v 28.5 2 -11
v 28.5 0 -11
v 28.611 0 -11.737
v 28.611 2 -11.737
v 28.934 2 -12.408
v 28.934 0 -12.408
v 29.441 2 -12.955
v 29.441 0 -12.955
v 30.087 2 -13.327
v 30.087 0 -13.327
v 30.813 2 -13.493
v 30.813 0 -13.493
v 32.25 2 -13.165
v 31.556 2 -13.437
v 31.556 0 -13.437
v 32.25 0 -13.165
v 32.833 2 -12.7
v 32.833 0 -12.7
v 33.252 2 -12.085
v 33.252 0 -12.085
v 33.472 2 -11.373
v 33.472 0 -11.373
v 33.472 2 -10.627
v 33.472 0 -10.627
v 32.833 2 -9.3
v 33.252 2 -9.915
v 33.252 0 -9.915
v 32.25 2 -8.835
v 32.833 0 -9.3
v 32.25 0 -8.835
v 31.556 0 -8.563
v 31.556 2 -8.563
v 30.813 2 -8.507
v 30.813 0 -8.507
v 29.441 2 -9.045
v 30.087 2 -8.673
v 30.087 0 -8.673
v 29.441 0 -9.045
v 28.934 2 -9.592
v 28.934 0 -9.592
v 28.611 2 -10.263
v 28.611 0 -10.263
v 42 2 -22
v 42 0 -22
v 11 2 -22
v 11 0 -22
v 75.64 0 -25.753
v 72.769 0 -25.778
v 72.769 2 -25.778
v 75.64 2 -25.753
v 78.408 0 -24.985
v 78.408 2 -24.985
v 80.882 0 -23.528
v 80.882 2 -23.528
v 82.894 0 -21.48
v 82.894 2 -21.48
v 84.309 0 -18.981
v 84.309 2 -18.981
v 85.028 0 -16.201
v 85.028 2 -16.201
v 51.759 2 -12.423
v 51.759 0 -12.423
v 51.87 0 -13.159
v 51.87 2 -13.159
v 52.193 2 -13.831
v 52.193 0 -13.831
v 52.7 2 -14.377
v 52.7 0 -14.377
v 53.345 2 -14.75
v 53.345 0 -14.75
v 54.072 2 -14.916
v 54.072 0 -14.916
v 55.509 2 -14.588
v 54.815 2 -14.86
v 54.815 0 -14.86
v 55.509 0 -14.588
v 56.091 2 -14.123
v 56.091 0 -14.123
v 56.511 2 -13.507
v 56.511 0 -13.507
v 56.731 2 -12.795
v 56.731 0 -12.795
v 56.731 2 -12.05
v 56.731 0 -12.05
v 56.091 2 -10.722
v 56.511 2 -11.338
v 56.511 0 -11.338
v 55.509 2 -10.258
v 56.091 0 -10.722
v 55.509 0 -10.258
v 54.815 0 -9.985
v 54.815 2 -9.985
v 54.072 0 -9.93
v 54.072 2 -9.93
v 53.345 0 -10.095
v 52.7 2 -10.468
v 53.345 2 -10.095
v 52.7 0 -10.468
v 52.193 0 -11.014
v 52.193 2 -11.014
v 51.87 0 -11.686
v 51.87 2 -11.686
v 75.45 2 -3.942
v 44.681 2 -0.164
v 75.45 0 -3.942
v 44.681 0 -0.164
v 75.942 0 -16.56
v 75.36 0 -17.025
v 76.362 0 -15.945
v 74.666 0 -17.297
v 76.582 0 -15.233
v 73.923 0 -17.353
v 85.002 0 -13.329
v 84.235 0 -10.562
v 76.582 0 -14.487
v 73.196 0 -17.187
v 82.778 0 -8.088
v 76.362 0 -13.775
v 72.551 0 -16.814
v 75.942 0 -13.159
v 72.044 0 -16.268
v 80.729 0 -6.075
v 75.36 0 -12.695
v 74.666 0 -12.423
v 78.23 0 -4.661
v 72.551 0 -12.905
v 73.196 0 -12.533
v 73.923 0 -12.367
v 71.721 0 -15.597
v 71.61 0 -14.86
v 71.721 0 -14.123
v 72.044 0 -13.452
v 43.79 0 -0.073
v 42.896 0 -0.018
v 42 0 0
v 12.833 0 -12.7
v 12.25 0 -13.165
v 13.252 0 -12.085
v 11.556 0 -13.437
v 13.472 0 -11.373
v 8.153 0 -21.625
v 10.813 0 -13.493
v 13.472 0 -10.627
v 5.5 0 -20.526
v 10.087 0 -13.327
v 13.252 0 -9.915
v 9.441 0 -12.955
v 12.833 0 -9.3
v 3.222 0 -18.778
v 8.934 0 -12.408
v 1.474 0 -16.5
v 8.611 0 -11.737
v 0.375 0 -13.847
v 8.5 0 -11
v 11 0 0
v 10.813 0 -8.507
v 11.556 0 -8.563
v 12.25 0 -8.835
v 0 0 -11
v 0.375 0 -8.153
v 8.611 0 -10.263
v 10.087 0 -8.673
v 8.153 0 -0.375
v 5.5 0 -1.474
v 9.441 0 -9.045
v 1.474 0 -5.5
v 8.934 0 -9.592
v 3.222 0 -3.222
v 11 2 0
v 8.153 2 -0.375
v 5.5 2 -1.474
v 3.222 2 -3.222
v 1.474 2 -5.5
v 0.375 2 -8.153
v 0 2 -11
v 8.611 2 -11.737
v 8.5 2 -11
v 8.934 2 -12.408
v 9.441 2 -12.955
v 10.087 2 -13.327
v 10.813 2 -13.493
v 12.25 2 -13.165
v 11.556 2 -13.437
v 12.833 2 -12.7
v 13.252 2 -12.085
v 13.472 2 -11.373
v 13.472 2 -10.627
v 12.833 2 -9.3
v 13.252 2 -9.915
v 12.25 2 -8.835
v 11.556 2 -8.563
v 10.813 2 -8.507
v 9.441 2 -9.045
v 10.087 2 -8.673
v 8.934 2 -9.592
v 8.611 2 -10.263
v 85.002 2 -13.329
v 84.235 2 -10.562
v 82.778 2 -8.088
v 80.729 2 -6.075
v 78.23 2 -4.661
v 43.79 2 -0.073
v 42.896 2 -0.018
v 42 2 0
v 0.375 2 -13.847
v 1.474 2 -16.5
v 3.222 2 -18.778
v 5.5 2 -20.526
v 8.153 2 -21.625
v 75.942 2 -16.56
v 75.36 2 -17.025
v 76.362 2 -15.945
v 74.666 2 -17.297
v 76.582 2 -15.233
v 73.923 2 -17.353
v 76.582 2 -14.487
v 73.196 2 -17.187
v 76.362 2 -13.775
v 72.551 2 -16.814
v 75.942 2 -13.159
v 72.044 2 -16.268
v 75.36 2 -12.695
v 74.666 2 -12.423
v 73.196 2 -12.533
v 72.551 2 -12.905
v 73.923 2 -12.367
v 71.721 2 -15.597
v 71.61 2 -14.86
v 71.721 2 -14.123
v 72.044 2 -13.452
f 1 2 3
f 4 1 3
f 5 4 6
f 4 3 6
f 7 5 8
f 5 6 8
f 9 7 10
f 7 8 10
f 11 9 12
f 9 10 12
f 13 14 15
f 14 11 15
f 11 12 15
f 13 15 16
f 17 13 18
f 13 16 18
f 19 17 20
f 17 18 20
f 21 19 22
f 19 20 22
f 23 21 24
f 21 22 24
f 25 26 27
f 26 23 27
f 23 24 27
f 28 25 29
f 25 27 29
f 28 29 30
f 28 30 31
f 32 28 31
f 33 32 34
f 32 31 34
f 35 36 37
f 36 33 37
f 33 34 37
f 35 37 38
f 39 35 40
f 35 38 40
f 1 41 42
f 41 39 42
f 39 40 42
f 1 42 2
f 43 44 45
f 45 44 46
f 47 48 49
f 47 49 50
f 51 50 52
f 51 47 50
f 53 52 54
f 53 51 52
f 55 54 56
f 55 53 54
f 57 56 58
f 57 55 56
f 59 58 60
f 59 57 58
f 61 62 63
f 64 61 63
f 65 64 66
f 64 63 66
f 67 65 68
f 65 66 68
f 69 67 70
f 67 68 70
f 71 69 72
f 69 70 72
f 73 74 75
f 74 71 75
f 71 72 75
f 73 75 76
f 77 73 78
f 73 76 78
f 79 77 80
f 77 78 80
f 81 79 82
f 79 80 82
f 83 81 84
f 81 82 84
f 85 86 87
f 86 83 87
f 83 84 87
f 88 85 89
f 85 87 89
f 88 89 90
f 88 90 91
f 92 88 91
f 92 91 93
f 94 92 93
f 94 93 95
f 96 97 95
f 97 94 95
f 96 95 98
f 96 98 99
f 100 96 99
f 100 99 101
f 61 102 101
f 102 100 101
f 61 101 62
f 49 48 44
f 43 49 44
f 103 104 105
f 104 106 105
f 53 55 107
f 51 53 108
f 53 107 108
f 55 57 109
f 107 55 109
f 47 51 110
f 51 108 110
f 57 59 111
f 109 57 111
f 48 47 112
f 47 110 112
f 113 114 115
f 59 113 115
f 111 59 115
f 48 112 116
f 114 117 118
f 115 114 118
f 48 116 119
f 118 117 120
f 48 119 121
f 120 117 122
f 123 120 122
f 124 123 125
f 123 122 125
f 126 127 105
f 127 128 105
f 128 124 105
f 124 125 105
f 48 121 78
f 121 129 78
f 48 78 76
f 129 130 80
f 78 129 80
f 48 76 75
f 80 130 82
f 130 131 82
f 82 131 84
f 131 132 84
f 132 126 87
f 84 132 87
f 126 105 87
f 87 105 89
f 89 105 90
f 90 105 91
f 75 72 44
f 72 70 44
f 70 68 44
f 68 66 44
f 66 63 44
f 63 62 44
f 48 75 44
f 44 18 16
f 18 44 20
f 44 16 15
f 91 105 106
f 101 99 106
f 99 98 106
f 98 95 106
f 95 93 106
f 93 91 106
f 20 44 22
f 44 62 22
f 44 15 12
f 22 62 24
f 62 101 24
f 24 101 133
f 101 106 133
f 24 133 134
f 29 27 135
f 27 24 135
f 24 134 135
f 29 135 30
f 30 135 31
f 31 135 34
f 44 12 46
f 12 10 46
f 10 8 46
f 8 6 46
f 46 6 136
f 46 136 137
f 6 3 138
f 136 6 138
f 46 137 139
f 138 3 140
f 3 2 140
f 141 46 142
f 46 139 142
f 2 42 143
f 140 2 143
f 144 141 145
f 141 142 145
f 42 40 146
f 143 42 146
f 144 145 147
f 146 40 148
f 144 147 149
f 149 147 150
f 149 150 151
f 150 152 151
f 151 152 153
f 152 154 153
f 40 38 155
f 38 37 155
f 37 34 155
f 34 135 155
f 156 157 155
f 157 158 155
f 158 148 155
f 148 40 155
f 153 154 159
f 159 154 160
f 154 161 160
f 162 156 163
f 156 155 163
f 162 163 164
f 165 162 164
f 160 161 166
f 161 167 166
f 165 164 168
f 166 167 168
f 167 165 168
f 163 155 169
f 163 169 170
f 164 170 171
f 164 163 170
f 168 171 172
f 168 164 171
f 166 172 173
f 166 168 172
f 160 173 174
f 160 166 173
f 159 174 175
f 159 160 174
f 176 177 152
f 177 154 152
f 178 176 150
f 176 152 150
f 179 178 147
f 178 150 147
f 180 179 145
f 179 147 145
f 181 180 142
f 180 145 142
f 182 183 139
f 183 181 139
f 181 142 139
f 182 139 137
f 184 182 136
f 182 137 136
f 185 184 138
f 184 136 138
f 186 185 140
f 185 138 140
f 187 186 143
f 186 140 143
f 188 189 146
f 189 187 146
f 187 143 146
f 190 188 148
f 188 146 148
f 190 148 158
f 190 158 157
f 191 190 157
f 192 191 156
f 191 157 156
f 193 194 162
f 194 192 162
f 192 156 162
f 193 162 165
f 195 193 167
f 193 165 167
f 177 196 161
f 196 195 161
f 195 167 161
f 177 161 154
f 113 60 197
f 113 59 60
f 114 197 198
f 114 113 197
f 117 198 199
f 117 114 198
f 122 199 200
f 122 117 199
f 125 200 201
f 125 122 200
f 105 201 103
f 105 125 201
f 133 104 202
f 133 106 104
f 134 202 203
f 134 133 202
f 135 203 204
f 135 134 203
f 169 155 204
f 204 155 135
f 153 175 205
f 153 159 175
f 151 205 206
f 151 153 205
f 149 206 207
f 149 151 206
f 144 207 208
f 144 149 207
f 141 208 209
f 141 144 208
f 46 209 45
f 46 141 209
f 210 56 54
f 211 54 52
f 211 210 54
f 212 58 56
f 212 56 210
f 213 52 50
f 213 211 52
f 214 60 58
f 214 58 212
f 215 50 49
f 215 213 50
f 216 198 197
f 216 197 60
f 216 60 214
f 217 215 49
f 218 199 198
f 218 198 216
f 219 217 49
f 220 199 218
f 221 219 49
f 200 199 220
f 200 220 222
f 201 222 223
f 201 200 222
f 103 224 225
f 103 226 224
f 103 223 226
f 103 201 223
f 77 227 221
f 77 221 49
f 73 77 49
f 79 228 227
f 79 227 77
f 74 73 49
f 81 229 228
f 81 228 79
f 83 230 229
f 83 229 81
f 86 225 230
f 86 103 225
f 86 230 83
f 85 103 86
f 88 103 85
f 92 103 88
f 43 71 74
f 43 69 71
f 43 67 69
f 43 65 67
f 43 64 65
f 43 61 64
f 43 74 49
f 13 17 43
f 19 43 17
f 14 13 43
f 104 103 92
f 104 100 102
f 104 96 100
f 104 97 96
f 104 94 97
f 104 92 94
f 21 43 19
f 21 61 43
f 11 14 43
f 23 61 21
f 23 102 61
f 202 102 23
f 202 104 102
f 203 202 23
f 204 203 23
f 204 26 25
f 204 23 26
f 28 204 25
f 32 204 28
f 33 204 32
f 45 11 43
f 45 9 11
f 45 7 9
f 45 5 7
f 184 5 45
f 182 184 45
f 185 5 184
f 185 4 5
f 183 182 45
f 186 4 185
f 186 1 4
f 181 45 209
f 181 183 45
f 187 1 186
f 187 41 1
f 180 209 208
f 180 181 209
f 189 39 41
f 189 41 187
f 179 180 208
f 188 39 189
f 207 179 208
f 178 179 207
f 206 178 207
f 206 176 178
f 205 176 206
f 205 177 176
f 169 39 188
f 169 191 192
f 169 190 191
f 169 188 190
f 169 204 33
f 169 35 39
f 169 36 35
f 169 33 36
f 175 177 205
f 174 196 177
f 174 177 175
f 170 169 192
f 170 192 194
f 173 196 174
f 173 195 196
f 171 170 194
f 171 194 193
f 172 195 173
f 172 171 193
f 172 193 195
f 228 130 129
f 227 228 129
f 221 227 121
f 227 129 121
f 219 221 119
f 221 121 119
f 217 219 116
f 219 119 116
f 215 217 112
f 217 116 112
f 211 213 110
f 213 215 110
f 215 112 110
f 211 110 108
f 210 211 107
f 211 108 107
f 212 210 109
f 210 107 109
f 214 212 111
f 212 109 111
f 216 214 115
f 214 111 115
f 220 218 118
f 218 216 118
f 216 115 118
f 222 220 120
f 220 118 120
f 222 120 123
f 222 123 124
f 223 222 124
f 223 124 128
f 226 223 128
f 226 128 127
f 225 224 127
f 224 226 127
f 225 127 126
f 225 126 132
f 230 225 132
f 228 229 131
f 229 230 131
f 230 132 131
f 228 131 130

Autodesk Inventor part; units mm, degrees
ref_plane "YZ Plane" through (0, 0, 0) normal (1, 0, 0) x (0, 1, 0)
ref_plane "XZ Plane" through (0, 0, 0) normal (0, 1, 0) x (-1, 0, 0)
ref_plane "XY Plane" through (0, 0, 0) normal (0, 0, 1) x (1, 0, 0)
sketch "Sketch1" plane through (0, 0, 0) normal (0, 1, 0) x (-1, 0, 0)
  line L0 (-11, 0) -> (-42, 0)
  line L1 (-42, 0) -> (-42, -22) construction
  line L2 (-42, -22) -> (-11, -22)
  line L3 (0, -11) -> (0, -11)
  arc A0 (-42, 0) -> (-44.6811, -0.164) centre (-42, -22) ccw
  line L4 (-42, -22) -> (-44.6811, -0.164) construction
  line L5 (-42, -22) -> (-20, -22) construction
  line L6 (-42, -22) -> (-44.6811, -0.164) construction
  line L7 (-44.6811, -0.164) -> (-75.4501, -3.9419)
  line L8 (-85.0275, -16.2005) -> (-85.0275, -16.2005)
  line L9 (-72.7689, -25.7779) -> (-42, -22)
  line L10 (0, 0) -> (-11, 0) construction
  line L11 (-11, 0) -> (-31, 0) construction
  line L12 (-11, 0) -> (-11, -11) construction
  line L13 (-31, 0) -> (-31, -11) construction
  circle A1 centre (-11, -11) radius 2.5
  circle A2 centre (-31, -11) radius 2.5
  line L14 (-44.6811, -0.164) -> (-55.5991, -1.5045) construction
  line L15 (-55.5991, -1.5045) -> (-54.2586, -12.4226) construction
  line L16 (-54.2586, -12.4226) -> (-74.1095, -14.8599) construction
  circle A3 centre (-74.1095, -14.8599) radius 2.5
  circle A4 centre (-54.2586, -12.4226) radius 2.5
  arc A5 (-11, -22) -> (0, -11) centre (-11, -11) ccw
  arc A6 (0, -11) -> (-11, 0) centre (-11, -11) ccw
  arc A7 (-85.0275, -16.2005) -> (-72.7689, -25.7779) centre (-74.1095, -14.8599) ccw
  arc A8 (-75.4501, -3.9419) -> (-85.0275, -16.2005) centre (-74.1095, -14.8599) ccw
  point P0 (0, -22)
  point P1 (-86.3681, -5.2825)
  point P2 (-83.6869, -27.1185)
  dimension "d0" = 42
  dimension "d3" = 97
  dimension "d4" = 42
  dimension "d5" = 11
  dimension "d6" = 20
  dimension "d7" = 22
  dimension "d8" = 11
  dimension "d9" = 11
  dimension "d10" = 5
  dimension "d11" = 5
  dimension "d12" = 11
  dimension "d13" = 11
  dimension "d14" = 90
  dimension "d15" = 20
  dimension "d16" = 5
  dimension "d17" = 5
  dimension "d20" = 11
  dimension "d21" = 11
extrude "Extrusion1" add sketch "Sketch1" along normal blind 2
properties part number "angle bracket"
